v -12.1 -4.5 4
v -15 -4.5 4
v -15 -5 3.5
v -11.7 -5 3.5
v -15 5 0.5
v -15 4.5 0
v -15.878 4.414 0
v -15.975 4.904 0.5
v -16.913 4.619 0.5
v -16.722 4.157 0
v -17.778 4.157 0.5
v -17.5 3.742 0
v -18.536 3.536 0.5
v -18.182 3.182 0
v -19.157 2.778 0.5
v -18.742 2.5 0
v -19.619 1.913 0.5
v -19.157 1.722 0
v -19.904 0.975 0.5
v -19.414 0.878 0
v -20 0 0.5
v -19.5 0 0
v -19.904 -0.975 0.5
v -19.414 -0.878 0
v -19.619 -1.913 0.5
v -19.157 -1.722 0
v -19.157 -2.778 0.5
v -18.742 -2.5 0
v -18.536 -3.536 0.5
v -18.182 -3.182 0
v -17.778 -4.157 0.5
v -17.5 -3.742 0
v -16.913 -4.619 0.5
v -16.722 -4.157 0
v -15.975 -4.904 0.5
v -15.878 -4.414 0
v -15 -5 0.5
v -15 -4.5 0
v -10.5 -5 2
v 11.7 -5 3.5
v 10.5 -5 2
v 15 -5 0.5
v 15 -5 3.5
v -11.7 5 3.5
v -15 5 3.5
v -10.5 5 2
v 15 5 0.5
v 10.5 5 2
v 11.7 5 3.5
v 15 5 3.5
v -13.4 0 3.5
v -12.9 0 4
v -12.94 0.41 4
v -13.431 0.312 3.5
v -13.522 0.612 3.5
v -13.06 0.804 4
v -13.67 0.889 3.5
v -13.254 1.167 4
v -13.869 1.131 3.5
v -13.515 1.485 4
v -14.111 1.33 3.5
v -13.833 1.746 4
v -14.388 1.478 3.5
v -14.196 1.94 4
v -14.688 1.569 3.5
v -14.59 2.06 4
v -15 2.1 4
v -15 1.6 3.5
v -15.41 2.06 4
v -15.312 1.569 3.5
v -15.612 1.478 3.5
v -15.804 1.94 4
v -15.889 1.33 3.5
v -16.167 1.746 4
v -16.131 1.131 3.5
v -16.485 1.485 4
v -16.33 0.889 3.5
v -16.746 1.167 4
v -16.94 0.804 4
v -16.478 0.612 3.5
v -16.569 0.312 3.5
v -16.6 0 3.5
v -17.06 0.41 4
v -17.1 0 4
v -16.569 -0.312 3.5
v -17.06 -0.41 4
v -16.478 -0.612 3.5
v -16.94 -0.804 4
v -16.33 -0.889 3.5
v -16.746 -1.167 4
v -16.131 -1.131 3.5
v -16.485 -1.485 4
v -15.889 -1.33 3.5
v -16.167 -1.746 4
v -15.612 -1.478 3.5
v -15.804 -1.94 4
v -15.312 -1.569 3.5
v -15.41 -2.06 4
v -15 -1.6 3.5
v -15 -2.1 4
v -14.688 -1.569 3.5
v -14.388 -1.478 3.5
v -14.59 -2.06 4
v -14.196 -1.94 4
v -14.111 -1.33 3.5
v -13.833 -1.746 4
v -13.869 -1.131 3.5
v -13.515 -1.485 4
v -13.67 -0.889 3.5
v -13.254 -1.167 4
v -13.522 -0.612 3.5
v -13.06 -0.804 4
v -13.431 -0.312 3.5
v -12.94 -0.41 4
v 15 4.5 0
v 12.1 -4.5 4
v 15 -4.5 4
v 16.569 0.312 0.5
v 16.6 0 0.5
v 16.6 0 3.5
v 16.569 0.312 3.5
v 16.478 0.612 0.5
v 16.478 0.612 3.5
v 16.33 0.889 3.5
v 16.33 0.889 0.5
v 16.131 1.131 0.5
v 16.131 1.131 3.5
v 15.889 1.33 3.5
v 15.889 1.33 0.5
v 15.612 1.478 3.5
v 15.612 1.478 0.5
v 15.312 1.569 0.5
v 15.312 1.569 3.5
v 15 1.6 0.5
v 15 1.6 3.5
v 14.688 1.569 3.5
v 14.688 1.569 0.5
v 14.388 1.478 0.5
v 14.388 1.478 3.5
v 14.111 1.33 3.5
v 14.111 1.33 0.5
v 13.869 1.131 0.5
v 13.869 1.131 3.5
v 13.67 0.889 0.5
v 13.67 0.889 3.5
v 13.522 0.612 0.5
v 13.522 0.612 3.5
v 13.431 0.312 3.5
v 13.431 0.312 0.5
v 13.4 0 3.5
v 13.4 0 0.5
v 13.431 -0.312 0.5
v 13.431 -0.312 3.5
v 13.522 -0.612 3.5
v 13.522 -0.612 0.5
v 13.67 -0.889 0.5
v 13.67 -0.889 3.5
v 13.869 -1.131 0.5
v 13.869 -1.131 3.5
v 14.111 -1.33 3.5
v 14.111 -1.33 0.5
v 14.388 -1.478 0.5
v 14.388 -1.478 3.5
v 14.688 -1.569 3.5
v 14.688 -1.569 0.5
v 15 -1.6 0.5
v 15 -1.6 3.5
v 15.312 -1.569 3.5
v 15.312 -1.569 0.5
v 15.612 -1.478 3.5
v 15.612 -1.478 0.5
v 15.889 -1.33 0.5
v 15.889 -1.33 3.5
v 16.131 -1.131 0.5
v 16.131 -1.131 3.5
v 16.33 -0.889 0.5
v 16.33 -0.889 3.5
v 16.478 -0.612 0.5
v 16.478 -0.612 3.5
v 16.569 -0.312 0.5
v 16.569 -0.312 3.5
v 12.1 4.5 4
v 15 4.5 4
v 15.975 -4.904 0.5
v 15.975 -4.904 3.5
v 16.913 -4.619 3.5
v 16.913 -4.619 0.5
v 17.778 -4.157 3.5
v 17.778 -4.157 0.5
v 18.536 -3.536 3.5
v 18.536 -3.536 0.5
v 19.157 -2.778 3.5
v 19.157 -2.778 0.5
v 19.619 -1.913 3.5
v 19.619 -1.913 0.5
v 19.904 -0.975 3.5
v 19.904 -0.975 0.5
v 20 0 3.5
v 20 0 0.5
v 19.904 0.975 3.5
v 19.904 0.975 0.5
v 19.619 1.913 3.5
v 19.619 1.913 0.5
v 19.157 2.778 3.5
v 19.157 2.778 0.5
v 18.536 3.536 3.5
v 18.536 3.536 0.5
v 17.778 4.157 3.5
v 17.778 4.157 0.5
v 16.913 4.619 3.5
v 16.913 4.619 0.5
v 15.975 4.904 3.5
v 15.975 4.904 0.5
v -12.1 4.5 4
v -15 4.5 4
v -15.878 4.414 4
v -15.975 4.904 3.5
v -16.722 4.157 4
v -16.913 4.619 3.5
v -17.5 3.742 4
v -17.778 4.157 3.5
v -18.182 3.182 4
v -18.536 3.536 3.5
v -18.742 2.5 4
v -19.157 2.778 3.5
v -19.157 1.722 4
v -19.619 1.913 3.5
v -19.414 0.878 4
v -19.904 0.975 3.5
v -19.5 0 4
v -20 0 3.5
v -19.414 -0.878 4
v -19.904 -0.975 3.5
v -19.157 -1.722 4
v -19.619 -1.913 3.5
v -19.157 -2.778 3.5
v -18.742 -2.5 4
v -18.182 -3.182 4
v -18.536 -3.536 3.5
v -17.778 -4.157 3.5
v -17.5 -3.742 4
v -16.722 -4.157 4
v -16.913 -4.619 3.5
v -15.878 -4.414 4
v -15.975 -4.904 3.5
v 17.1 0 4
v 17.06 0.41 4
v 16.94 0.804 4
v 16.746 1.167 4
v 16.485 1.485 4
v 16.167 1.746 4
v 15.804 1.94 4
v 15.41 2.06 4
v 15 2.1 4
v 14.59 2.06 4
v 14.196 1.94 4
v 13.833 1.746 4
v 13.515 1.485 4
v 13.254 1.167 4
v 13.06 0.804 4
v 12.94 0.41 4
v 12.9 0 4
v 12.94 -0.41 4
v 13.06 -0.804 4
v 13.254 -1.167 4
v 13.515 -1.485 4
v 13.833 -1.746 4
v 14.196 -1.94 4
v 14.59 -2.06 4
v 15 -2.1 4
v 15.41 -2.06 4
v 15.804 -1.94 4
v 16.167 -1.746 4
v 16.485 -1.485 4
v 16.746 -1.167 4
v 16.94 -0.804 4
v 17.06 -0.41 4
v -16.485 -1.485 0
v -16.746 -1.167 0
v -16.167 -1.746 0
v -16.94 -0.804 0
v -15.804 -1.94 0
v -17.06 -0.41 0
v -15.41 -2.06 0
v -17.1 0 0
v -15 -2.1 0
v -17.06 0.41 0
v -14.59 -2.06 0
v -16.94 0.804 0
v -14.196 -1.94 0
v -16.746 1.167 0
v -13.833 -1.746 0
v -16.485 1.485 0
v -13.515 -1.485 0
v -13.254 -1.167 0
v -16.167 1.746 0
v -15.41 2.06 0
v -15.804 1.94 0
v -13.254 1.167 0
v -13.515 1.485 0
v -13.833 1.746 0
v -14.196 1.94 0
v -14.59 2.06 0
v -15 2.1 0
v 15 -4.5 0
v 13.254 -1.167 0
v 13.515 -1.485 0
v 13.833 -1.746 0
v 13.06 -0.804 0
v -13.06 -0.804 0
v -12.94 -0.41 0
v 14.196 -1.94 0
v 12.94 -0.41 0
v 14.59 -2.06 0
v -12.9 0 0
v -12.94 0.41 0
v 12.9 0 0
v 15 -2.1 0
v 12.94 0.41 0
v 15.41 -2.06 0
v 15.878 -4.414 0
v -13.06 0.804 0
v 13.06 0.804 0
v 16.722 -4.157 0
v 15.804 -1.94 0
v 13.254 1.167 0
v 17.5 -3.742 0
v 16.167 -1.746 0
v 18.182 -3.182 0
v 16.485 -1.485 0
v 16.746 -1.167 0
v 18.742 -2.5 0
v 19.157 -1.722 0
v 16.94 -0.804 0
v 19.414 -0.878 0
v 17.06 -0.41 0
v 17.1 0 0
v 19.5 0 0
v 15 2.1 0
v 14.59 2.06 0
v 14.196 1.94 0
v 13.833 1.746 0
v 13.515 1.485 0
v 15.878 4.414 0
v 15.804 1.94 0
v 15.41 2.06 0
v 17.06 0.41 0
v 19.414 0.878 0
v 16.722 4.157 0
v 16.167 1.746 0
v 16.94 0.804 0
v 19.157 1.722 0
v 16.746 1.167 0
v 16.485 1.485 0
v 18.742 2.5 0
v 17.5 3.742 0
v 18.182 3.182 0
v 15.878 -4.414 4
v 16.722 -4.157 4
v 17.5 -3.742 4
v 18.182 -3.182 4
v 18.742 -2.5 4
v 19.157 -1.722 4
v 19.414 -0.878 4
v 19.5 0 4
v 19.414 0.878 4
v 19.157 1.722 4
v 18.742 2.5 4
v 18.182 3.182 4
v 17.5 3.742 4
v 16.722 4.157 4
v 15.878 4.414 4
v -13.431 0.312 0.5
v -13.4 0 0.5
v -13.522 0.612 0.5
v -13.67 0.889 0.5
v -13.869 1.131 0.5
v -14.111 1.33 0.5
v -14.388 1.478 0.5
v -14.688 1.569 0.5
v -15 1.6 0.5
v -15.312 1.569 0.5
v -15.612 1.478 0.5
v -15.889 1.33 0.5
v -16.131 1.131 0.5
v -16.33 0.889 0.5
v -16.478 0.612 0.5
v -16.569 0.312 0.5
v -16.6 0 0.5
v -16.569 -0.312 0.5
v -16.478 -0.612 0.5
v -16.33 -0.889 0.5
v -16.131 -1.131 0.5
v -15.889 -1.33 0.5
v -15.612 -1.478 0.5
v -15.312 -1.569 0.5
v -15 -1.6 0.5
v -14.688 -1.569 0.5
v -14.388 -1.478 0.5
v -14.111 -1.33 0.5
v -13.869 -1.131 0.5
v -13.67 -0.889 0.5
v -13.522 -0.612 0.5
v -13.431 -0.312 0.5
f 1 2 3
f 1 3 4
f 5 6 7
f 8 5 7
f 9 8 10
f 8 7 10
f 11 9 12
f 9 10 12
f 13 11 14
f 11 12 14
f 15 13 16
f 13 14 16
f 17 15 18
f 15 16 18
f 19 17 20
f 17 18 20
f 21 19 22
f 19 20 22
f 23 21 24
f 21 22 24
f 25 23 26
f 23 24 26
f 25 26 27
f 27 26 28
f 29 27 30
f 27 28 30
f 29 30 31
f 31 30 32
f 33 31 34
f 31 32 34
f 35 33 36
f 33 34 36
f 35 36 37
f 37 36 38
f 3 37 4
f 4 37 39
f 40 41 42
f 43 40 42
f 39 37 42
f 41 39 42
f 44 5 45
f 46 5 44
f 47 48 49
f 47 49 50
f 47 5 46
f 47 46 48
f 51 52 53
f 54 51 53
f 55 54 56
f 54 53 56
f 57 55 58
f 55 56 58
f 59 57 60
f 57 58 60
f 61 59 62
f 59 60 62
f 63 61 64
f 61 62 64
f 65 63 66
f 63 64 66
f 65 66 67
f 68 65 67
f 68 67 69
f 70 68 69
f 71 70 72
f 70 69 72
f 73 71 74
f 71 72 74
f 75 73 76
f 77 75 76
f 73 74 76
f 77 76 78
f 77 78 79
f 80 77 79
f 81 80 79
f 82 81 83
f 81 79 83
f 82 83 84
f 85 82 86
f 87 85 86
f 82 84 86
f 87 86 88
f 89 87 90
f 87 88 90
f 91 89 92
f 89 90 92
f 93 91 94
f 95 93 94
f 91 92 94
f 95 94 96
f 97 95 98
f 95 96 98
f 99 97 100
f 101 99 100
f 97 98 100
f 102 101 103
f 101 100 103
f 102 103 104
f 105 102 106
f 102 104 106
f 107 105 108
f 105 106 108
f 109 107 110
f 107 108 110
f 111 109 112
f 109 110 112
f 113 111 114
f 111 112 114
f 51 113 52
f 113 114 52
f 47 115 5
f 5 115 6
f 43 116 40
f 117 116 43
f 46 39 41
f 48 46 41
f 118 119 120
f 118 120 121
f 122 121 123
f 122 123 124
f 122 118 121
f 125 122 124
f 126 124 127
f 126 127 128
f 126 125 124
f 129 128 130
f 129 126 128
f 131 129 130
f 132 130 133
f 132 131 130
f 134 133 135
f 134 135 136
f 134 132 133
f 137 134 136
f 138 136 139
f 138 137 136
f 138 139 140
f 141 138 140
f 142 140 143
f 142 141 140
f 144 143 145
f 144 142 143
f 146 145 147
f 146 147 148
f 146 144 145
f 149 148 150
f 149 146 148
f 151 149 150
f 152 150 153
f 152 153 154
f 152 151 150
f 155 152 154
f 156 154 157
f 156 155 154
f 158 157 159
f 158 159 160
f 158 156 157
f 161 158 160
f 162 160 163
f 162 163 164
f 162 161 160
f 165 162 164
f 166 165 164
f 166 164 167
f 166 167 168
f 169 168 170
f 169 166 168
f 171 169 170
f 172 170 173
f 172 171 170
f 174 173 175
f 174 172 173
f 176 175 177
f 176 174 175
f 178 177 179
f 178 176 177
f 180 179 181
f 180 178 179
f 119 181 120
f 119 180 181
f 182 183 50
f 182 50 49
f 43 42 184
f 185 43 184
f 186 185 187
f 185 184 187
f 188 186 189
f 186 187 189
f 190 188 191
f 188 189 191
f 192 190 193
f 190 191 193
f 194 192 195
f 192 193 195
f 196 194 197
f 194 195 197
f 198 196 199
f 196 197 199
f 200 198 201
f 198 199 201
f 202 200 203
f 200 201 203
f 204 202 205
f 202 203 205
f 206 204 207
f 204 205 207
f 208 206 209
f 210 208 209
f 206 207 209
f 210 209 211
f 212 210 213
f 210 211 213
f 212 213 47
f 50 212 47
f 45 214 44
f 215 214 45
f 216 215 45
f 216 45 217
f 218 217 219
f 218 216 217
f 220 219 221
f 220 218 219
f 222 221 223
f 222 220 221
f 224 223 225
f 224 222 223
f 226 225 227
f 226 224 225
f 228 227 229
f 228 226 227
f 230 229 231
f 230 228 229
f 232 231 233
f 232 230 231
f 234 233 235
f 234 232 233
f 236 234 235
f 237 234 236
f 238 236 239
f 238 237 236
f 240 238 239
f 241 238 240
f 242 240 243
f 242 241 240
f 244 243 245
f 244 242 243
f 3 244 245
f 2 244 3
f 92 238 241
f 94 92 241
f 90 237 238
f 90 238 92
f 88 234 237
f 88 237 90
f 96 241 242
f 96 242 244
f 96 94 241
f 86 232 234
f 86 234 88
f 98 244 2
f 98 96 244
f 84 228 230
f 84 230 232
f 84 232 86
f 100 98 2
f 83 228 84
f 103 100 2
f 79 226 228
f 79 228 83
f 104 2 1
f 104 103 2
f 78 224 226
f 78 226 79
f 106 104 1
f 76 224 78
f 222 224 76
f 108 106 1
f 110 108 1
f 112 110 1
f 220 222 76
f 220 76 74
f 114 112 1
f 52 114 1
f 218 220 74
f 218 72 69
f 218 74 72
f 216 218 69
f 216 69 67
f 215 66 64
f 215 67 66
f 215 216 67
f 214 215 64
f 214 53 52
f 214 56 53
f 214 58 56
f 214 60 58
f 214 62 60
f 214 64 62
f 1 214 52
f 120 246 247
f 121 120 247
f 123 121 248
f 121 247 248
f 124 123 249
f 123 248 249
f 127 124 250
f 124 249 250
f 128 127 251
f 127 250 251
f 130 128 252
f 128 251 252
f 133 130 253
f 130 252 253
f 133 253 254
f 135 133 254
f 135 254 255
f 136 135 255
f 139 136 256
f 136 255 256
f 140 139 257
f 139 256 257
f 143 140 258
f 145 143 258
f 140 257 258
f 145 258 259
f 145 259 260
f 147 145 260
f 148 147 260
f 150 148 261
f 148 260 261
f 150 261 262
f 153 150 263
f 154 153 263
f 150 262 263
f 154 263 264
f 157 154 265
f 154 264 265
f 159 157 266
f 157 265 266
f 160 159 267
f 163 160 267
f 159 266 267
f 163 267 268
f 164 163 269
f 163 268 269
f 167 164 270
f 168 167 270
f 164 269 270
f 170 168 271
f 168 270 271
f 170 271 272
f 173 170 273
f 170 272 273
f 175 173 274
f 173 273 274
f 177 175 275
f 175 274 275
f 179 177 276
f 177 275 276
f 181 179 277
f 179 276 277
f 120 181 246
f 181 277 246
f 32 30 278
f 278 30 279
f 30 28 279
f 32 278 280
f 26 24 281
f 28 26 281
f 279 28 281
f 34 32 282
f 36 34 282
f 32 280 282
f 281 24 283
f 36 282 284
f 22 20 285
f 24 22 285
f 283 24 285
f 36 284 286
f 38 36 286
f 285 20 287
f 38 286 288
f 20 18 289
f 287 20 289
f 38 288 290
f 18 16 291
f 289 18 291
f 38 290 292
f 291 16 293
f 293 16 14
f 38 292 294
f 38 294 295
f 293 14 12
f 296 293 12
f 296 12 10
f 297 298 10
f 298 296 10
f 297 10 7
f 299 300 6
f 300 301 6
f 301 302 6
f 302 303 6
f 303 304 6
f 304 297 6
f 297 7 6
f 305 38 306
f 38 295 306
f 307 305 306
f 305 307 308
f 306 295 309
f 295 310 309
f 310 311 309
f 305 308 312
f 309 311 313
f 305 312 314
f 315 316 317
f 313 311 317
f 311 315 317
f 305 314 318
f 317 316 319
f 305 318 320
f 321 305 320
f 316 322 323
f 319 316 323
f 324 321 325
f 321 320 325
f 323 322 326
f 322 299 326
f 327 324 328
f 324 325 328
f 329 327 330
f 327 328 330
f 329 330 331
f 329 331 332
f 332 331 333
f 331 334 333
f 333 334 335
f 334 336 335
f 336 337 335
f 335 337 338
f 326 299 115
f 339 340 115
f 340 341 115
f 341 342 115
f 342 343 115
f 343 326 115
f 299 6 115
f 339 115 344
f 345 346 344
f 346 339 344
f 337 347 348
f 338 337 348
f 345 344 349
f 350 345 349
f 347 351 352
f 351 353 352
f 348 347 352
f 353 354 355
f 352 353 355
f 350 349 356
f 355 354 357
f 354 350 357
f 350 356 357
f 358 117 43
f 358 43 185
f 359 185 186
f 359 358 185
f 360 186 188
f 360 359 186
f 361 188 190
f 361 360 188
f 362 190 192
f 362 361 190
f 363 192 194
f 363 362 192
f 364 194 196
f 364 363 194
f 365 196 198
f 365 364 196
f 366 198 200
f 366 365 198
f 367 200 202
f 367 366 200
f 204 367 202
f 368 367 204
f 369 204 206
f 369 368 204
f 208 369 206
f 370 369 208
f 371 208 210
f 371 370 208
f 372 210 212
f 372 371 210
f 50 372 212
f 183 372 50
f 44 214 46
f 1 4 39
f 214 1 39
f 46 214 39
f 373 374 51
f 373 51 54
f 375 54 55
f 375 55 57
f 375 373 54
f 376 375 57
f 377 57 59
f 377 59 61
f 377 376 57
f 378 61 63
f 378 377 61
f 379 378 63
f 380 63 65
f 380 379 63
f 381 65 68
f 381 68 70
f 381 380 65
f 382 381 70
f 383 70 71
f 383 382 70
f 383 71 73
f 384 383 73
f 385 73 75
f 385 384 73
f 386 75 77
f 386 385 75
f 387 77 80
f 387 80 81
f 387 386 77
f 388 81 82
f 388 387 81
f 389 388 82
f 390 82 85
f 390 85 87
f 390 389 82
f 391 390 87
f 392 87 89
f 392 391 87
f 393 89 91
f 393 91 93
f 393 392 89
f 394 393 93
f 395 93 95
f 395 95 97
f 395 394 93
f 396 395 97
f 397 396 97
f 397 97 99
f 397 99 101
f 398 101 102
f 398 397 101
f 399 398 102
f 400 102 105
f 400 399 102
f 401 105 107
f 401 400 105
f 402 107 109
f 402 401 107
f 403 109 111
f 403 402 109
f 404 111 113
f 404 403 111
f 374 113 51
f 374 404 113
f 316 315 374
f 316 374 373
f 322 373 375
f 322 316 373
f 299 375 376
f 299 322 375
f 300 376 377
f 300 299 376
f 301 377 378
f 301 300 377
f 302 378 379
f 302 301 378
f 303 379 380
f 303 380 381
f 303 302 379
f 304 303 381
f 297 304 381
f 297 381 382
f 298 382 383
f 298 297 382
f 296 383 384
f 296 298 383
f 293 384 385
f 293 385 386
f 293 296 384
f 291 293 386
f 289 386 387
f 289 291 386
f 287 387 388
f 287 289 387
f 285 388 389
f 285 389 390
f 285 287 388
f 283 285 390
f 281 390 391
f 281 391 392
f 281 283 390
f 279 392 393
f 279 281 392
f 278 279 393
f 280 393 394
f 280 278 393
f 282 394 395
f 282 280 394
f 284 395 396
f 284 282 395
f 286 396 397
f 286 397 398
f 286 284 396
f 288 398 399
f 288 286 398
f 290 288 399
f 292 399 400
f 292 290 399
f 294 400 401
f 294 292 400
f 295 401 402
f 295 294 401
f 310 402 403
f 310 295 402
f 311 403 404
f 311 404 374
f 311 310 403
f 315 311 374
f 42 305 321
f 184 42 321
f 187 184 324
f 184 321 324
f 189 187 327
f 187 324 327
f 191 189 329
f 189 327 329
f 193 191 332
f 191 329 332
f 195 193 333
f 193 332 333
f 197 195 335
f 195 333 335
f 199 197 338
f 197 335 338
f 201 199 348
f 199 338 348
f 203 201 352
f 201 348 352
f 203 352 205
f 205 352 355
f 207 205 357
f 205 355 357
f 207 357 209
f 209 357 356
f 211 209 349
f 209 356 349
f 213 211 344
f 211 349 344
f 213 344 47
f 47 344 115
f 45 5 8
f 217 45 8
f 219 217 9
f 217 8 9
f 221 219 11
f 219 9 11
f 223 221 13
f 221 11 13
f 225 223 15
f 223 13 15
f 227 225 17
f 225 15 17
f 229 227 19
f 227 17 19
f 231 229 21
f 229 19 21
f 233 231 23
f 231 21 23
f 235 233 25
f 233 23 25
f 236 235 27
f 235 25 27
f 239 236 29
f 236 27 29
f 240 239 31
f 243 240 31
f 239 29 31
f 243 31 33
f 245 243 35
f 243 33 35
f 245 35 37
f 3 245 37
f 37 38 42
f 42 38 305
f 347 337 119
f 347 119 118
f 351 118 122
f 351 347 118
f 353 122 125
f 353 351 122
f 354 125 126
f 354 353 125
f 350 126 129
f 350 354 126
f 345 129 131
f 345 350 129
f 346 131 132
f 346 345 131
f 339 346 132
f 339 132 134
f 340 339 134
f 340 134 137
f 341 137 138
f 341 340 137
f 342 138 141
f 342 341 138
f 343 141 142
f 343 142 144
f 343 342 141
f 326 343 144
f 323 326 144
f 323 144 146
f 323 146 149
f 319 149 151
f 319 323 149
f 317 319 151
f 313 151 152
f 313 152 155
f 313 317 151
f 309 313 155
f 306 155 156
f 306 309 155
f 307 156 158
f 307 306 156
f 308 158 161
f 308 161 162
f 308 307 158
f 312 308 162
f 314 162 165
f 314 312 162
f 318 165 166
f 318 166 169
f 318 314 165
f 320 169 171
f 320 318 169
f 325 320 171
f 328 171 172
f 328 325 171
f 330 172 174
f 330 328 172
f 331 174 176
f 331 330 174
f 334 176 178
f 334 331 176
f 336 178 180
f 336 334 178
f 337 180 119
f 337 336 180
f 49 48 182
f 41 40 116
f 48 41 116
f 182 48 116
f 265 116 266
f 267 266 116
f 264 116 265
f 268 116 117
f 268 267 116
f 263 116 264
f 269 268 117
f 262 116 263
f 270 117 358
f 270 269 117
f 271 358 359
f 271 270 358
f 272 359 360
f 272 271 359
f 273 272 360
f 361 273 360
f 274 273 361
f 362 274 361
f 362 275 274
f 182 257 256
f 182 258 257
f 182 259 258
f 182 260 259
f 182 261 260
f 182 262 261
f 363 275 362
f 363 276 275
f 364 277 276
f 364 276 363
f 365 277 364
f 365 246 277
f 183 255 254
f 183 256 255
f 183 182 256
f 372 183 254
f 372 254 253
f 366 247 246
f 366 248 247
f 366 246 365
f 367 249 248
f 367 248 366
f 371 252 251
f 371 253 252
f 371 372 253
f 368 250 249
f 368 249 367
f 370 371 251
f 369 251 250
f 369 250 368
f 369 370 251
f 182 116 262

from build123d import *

# Parameters (mm, degrees)
SKETCH_R     = 1.6
PAD_DEPTH    = 4
CHAMFER_SIZE = 0.5
POCKET_DEPTH = 10.001


with BuildPart() as part:
    # Sketch → Pad (new body)
    with BuildSketch(Plane.XY):
        with BuildLine():
            ThreePointArc((-15, 5), (-20, 0), (-15, -5))
            Line((-15, -5), (15, -5))
            ThreePointArc((15, -5), (20, 0), (15, 5))
            Line((-15, 5), (15, 5))
        make_face()
        with Locations((-15, 0)):
            Circle(SKETCH_R, mode=Mode.SUBTRACT)
        with Locations((15, 0)):
            Circle(SKETCH_R, mode=Mode.SUBTRACT)
    extrude(amount=PAD_DEPTH)

    # Chamfer
    chamfer_edges = [part.edges().sort_by_distance(p)[0] for p in [
        (-20, 0, 4),
        (0, -5, 4),
        (20, 0, 4),
        (0, 5, 4),
        (13.4, 0, 4),
        (-16.6, 0, 4),
        (-20, 0, 0),
        (0, -5, 0),
        (20, 0, 0),
        (0, 5, 0),
        (13.4, 0, 0),
        (-16.6, 0, 0),
    ]]
    chamfer(chamfer_edges, length=CHAMFER_SIZE)

    # Sketch001 → Pocket (cut, through all)
    with BuildSketch(Plane.XZ.offset(5)):
        Polygon((-12.5, 4.5), (-10.5, 2), (10.5, 2), (12.5, 4.5), align=None)
    extrude(amount=-POCKET_DEPTH, mode=Mode.SUBTRACT)


solid = part.part
